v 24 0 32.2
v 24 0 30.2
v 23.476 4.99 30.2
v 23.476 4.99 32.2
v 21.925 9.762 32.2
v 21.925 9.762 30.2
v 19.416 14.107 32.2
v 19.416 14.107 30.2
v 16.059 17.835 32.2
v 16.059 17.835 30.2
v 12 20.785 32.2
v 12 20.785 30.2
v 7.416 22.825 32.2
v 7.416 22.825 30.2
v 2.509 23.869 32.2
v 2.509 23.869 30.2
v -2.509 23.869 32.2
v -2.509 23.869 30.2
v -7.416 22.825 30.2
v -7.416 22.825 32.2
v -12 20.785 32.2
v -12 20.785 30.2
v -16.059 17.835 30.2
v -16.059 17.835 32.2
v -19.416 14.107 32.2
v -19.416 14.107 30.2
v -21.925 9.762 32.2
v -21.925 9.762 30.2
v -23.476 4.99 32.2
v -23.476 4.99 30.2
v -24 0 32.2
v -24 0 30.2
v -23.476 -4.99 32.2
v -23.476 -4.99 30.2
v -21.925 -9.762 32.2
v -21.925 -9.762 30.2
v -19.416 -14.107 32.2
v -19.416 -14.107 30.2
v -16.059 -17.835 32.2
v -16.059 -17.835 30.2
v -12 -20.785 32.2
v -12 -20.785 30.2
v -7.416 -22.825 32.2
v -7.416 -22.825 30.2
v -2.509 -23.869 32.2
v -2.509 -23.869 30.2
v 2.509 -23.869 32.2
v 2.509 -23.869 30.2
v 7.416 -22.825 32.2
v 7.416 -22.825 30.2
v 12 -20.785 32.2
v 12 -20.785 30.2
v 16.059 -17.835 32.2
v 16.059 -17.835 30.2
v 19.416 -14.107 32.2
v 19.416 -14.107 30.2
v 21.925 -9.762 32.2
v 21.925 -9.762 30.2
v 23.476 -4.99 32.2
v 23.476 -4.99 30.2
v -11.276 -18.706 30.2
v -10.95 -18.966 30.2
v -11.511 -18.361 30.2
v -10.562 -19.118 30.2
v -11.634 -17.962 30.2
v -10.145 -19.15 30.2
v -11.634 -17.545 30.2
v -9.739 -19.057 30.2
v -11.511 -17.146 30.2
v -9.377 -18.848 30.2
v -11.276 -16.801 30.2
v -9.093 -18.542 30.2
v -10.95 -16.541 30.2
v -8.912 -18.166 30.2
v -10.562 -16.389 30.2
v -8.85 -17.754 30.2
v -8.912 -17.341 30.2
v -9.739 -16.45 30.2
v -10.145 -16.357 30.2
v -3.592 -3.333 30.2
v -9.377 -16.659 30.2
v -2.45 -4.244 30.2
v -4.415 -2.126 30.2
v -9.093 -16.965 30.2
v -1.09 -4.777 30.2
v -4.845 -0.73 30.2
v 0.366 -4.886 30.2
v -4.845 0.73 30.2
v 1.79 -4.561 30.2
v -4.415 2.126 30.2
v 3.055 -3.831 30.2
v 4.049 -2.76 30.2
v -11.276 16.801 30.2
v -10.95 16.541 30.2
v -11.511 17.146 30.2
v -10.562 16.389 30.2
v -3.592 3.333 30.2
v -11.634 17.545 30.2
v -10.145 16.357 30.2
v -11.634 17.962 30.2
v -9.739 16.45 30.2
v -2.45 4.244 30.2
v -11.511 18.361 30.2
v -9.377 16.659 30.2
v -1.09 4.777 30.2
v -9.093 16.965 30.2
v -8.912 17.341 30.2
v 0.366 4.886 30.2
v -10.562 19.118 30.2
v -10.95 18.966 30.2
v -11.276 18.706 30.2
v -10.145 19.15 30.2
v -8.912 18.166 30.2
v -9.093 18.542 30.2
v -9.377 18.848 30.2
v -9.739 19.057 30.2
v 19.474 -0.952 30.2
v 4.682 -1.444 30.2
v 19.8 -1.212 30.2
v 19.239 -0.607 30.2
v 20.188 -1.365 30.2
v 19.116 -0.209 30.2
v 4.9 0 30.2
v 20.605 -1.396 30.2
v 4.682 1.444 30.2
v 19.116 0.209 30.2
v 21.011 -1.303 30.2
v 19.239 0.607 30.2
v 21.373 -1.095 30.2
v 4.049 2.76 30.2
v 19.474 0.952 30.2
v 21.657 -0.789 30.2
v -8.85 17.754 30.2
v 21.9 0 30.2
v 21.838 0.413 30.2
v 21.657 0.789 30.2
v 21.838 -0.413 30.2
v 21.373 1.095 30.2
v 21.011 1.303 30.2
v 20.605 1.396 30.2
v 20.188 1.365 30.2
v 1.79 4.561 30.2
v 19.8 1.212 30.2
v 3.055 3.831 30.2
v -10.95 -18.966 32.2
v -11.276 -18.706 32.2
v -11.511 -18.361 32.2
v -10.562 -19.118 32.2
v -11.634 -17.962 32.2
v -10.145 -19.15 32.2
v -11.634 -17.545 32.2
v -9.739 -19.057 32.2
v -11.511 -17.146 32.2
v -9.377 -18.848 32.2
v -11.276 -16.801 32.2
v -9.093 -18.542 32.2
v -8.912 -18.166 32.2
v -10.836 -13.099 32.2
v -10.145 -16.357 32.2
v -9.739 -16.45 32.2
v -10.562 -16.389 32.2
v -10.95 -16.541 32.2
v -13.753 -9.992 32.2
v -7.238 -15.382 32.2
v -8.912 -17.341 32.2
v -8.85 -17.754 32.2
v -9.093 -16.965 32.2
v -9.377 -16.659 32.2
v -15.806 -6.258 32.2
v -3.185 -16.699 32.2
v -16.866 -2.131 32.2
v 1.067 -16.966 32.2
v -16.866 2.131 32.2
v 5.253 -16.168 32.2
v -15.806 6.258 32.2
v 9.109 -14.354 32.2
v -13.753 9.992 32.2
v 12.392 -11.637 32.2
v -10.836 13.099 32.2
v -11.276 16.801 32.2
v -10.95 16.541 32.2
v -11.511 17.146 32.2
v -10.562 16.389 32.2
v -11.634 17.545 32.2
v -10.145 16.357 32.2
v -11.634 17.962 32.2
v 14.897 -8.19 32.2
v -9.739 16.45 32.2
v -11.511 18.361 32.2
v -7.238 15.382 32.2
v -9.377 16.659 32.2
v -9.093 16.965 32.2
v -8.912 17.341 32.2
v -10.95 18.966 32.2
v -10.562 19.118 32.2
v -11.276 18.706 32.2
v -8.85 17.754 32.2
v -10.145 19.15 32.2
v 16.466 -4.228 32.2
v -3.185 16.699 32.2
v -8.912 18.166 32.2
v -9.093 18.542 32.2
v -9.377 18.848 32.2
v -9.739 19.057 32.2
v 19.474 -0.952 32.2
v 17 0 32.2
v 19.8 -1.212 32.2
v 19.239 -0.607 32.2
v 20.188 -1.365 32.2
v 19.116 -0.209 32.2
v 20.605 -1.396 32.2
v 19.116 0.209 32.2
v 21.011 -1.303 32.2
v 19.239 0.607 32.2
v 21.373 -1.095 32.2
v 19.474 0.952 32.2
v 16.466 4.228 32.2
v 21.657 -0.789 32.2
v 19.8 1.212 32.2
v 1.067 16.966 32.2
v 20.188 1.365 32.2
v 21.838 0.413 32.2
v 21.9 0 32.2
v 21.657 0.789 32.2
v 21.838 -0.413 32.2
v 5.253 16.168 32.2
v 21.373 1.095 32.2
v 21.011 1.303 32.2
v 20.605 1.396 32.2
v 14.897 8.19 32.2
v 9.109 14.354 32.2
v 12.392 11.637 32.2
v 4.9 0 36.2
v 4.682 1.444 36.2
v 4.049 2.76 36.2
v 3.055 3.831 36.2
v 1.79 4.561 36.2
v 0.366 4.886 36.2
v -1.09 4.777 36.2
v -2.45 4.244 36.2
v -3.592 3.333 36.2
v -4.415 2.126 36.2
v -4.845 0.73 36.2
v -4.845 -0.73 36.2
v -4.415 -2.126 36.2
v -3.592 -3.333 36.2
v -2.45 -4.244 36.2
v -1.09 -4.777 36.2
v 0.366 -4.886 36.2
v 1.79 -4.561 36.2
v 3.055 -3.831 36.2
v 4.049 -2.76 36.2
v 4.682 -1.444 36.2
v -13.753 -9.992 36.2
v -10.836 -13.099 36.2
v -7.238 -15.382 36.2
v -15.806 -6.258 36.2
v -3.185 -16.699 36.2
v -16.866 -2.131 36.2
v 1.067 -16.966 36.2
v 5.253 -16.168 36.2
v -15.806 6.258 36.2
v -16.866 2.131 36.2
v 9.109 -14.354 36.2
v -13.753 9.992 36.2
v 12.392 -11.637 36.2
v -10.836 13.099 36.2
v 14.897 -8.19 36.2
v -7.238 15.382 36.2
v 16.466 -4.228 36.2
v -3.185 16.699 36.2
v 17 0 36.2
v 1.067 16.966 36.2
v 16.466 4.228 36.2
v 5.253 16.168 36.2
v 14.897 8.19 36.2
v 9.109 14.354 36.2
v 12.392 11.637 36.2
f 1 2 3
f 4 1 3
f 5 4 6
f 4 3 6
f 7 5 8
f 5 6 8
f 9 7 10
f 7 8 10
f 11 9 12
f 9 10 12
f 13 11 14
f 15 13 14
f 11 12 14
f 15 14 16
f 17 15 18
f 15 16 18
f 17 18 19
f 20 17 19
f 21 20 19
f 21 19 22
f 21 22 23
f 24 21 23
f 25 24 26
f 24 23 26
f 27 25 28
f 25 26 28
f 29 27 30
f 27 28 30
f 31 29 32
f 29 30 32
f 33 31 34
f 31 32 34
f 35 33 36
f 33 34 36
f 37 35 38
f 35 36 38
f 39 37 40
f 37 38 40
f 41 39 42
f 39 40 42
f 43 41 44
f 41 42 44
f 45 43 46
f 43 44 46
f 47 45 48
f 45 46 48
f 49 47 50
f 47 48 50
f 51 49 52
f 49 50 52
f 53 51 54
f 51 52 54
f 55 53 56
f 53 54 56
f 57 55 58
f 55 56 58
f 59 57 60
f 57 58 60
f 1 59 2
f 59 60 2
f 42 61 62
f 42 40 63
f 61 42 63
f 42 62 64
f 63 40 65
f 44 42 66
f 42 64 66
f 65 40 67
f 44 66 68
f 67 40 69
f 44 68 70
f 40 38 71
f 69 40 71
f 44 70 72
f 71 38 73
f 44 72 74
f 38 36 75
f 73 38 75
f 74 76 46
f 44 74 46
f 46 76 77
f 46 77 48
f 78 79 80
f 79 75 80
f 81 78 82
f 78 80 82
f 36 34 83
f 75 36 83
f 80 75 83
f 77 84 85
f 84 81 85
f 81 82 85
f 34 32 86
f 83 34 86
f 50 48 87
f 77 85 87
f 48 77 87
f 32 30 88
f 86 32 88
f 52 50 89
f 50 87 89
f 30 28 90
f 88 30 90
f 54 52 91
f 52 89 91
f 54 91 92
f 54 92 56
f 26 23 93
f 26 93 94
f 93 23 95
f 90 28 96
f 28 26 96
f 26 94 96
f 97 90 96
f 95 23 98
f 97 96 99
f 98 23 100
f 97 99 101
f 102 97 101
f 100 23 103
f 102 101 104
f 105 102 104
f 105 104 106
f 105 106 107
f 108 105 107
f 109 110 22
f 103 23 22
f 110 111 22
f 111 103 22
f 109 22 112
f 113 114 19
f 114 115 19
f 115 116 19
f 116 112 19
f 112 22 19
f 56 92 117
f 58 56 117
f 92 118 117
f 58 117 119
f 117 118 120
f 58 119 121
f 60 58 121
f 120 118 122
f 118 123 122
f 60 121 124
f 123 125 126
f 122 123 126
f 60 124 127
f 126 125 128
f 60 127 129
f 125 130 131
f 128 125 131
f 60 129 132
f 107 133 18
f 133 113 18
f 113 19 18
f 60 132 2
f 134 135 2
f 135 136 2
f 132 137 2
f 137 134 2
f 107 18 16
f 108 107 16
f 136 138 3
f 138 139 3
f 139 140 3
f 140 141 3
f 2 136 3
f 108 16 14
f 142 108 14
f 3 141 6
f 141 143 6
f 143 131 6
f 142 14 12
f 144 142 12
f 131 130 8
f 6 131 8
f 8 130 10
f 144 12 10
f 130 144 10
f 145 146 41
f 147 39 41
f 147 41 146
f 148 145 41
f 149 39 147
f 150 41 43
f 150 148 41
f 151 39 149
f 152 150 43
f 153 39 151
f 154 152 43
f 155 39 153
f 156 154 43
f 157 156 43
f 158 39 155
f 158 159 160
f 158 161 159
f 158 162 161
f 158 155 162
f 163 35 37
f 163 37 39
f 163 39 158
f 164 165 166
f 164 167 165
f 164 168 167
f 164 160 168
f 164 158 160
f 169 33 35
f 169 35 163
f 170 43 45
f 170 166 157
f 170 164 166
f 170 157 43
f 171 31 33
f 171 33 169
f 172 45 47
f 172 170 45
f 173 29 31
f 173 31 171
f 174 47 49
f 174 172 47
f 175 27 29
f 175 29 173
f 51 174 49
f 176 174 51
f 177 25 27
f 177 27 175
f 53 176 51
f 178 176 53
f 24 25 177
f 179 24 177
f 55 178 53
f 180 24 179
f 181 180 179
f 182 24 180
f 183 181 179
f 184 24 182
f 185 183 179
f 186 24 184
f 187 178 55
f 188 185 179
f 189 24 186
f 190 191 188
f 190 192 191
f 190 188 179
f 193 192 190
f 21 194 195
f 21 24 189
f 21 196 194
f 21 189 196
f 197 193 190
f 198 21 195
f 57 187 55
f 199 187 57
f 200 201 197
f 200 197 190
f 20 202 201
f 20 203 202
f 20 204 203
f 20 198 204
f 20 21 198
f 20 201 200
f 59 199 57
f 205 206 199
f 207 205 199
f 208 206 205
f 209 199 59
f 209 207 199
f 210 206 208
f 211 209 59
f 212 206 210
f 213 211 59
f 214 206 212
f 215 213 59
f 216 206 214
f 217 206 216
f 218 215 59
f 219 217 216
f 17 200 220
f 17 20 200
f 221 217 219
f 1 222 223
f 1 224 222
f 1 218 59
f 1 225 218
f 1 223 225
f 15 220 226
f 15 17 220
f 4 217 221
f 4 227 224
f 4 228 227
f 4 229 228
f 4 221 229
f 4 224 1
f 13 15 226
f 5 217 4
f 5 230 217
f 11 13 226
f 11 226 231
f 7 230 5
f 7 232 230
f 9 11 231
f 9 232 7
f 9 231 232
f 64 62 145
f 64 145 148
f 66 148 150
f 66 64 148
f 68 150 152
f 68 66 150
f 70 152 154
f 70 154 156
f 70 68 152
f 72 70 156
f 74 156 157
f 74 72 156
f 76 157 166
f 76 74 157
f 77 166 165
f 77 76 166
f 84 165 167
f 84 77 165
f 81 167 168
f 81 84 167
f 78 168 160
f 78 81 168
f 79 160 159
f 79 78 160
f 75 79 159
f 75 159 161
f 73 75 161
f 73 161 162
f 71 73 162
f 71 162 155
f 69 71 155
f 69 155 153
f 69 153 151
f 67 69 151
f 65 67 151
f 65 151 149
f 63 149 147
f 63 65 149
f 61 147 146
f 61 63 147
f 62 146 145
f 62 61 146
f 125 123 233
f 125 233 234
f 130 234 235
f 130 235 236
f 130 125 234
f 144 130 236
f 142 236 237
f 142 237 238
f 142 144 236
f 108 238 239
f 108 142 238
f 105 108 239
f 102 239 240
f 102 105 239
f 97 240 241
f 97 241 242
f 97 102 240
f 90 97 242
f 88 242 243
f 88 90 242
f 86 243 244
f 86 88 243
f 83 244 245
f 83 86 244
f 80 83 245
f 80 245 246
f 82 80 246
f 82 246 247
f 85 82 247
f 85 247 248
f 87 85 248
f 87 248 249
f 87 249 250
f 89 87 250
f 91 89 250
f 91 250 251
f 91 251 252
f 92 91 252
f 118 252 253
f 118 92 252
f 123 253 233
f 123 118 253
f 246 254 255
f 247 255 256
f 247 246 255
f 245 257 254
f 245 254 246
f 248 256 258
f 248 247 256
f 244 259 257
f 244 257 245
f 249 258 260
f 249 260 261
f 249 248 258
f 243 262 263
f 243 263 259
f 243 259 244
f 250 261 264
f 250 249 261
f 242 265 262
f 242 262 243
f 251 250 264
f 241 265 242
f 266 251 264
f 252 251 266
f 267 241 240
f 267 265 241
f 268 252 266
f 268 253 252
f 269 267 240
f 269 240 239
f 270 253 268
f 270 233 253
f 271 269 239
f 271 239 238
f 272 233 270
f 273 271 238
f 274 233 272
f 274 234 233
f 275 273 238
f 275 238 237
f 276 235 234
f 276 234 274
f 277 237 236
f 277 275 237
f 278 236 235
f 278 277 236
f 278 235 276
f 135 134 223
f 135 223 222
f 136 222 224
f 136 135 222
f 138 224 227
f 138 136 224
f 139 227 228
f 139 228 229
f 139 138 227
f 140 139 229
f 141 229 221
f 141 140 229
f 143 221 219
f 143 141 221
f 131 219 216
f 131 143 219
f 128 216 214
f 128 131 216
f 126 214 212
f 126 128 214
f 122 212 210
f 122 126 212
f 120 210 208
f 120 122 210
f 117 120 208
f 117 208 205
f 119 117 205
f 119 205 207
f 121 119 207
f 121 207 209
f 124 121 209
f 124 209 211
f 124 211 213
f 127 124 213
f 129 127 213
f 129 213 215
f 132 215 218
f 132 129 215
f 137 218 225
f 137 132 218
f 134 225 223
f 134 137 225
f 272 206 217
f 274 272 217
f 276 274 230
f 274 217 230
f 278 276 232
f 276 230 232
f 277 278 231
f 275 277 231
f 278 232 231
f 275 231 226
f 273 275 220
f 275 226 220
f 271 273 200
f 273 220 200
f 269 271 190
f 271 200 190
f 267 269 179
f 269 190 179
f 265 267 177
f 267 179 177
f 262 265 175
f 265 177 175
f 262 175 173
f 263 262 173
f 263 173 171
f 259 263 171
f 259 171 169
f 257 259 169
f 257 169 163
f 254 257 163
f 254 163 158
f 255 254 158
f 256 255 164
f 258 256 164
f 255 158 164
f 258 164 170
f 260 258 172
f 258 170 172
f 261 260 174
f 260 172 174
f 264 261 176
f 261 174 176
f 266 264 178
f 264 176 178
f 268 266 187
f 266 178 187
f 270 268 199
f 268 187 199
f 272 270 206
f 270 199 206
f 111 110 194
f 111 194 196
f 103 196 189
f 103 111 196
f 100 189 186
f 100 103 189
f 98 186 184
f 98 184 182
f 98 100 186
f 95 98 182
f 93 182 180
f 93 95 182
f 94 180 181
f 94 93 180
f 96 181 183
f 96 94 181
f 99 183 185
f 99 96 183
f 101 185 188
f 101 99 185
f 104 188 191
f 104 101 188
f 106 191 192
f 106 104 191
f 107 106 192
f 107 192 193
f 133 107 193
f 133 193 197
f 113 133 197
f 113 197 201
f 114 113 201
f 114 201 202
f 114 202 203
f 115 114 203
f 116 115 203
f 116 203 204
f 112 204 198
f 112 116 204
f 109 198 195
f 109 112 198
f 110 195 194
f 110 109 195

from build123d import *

# Parameters (mm, degrees)
CYLINDER058_R     = 1.4
CYLINDER058_DEPTH = 2
ARRAY012_COUNT    = 3
CYLINDER057_R     = 4.9
CYLINDER057_DEPTH = 6
CYLINDER056_R     = 24
CYLINDER056_DEPTH = 2
CYLINDER055_R     = 17
CYLINDER055_DEPTH = 4


with BuildPart() as screw_holes:
    # Cylinder058 → Cylinder058 (new body)
    with BuildSketch(Plane(origin=(20.5, 0, 0), x_dir=(1, 0, 0), z_dir=(0, 0, 1))):
        Circle(CYLINDER058_R)
    extrude(amount=CYLINDER058_DEPTH)

    # Array012: screw-holes ×3 about axis
    array012_axis = Axis((0, 0, 0), (0, 0, 1))


with BuildPart() as screw_holes_1:
    add(screw_holes.part)
    for i in range(1, ARRAY012_COUNT):
        add(screw_holes.part.rotate(array012_axis, i * 360 / ARRAY012_COUNT))


with BuildPart() as pot_thread_hole:
    # Cylinder057 → Cylinder057 (new body)
    with BuildSketch(Plane.XY):
        Circle(CYLINDER057_R)
    extrude(amount=CYLINDER057_DEPTH)


with BuildPart() as brim:
    # Cylinder056 → Cylinder056 (new body)
    with BuildSketch(Plane.XY):
        Circle(CYLINDER056_R)
    extrude(amount=CYLINDER056_DEPTH)


with BuildPart() as pot_mount001:
    # Cylinder055 → Cylinder055 (new body)
    with BuildSketch(Plane.XY.offset(2)):
        Circle(CYLINDER055_R)
    extrude(amount=CYLINDER055_DEPTH)

    # Fusion025: union brim
    add(brim.part)

    # Cut046: cut pot-thread-hole
    add(pot_thread_hole.part, mode=Mode.SUBTRACT)

    # Cut047: cut screw-holes
    add(screw_holes_1.part, mode=Mode.SUBTRACT)


with BuildPart() as pot_mount001_1:
    # Cut047 placement: moved
    add(pot_mount001.part.moved(Location((0, 0, 30.2))))


solid = pot_mount001_1.part
